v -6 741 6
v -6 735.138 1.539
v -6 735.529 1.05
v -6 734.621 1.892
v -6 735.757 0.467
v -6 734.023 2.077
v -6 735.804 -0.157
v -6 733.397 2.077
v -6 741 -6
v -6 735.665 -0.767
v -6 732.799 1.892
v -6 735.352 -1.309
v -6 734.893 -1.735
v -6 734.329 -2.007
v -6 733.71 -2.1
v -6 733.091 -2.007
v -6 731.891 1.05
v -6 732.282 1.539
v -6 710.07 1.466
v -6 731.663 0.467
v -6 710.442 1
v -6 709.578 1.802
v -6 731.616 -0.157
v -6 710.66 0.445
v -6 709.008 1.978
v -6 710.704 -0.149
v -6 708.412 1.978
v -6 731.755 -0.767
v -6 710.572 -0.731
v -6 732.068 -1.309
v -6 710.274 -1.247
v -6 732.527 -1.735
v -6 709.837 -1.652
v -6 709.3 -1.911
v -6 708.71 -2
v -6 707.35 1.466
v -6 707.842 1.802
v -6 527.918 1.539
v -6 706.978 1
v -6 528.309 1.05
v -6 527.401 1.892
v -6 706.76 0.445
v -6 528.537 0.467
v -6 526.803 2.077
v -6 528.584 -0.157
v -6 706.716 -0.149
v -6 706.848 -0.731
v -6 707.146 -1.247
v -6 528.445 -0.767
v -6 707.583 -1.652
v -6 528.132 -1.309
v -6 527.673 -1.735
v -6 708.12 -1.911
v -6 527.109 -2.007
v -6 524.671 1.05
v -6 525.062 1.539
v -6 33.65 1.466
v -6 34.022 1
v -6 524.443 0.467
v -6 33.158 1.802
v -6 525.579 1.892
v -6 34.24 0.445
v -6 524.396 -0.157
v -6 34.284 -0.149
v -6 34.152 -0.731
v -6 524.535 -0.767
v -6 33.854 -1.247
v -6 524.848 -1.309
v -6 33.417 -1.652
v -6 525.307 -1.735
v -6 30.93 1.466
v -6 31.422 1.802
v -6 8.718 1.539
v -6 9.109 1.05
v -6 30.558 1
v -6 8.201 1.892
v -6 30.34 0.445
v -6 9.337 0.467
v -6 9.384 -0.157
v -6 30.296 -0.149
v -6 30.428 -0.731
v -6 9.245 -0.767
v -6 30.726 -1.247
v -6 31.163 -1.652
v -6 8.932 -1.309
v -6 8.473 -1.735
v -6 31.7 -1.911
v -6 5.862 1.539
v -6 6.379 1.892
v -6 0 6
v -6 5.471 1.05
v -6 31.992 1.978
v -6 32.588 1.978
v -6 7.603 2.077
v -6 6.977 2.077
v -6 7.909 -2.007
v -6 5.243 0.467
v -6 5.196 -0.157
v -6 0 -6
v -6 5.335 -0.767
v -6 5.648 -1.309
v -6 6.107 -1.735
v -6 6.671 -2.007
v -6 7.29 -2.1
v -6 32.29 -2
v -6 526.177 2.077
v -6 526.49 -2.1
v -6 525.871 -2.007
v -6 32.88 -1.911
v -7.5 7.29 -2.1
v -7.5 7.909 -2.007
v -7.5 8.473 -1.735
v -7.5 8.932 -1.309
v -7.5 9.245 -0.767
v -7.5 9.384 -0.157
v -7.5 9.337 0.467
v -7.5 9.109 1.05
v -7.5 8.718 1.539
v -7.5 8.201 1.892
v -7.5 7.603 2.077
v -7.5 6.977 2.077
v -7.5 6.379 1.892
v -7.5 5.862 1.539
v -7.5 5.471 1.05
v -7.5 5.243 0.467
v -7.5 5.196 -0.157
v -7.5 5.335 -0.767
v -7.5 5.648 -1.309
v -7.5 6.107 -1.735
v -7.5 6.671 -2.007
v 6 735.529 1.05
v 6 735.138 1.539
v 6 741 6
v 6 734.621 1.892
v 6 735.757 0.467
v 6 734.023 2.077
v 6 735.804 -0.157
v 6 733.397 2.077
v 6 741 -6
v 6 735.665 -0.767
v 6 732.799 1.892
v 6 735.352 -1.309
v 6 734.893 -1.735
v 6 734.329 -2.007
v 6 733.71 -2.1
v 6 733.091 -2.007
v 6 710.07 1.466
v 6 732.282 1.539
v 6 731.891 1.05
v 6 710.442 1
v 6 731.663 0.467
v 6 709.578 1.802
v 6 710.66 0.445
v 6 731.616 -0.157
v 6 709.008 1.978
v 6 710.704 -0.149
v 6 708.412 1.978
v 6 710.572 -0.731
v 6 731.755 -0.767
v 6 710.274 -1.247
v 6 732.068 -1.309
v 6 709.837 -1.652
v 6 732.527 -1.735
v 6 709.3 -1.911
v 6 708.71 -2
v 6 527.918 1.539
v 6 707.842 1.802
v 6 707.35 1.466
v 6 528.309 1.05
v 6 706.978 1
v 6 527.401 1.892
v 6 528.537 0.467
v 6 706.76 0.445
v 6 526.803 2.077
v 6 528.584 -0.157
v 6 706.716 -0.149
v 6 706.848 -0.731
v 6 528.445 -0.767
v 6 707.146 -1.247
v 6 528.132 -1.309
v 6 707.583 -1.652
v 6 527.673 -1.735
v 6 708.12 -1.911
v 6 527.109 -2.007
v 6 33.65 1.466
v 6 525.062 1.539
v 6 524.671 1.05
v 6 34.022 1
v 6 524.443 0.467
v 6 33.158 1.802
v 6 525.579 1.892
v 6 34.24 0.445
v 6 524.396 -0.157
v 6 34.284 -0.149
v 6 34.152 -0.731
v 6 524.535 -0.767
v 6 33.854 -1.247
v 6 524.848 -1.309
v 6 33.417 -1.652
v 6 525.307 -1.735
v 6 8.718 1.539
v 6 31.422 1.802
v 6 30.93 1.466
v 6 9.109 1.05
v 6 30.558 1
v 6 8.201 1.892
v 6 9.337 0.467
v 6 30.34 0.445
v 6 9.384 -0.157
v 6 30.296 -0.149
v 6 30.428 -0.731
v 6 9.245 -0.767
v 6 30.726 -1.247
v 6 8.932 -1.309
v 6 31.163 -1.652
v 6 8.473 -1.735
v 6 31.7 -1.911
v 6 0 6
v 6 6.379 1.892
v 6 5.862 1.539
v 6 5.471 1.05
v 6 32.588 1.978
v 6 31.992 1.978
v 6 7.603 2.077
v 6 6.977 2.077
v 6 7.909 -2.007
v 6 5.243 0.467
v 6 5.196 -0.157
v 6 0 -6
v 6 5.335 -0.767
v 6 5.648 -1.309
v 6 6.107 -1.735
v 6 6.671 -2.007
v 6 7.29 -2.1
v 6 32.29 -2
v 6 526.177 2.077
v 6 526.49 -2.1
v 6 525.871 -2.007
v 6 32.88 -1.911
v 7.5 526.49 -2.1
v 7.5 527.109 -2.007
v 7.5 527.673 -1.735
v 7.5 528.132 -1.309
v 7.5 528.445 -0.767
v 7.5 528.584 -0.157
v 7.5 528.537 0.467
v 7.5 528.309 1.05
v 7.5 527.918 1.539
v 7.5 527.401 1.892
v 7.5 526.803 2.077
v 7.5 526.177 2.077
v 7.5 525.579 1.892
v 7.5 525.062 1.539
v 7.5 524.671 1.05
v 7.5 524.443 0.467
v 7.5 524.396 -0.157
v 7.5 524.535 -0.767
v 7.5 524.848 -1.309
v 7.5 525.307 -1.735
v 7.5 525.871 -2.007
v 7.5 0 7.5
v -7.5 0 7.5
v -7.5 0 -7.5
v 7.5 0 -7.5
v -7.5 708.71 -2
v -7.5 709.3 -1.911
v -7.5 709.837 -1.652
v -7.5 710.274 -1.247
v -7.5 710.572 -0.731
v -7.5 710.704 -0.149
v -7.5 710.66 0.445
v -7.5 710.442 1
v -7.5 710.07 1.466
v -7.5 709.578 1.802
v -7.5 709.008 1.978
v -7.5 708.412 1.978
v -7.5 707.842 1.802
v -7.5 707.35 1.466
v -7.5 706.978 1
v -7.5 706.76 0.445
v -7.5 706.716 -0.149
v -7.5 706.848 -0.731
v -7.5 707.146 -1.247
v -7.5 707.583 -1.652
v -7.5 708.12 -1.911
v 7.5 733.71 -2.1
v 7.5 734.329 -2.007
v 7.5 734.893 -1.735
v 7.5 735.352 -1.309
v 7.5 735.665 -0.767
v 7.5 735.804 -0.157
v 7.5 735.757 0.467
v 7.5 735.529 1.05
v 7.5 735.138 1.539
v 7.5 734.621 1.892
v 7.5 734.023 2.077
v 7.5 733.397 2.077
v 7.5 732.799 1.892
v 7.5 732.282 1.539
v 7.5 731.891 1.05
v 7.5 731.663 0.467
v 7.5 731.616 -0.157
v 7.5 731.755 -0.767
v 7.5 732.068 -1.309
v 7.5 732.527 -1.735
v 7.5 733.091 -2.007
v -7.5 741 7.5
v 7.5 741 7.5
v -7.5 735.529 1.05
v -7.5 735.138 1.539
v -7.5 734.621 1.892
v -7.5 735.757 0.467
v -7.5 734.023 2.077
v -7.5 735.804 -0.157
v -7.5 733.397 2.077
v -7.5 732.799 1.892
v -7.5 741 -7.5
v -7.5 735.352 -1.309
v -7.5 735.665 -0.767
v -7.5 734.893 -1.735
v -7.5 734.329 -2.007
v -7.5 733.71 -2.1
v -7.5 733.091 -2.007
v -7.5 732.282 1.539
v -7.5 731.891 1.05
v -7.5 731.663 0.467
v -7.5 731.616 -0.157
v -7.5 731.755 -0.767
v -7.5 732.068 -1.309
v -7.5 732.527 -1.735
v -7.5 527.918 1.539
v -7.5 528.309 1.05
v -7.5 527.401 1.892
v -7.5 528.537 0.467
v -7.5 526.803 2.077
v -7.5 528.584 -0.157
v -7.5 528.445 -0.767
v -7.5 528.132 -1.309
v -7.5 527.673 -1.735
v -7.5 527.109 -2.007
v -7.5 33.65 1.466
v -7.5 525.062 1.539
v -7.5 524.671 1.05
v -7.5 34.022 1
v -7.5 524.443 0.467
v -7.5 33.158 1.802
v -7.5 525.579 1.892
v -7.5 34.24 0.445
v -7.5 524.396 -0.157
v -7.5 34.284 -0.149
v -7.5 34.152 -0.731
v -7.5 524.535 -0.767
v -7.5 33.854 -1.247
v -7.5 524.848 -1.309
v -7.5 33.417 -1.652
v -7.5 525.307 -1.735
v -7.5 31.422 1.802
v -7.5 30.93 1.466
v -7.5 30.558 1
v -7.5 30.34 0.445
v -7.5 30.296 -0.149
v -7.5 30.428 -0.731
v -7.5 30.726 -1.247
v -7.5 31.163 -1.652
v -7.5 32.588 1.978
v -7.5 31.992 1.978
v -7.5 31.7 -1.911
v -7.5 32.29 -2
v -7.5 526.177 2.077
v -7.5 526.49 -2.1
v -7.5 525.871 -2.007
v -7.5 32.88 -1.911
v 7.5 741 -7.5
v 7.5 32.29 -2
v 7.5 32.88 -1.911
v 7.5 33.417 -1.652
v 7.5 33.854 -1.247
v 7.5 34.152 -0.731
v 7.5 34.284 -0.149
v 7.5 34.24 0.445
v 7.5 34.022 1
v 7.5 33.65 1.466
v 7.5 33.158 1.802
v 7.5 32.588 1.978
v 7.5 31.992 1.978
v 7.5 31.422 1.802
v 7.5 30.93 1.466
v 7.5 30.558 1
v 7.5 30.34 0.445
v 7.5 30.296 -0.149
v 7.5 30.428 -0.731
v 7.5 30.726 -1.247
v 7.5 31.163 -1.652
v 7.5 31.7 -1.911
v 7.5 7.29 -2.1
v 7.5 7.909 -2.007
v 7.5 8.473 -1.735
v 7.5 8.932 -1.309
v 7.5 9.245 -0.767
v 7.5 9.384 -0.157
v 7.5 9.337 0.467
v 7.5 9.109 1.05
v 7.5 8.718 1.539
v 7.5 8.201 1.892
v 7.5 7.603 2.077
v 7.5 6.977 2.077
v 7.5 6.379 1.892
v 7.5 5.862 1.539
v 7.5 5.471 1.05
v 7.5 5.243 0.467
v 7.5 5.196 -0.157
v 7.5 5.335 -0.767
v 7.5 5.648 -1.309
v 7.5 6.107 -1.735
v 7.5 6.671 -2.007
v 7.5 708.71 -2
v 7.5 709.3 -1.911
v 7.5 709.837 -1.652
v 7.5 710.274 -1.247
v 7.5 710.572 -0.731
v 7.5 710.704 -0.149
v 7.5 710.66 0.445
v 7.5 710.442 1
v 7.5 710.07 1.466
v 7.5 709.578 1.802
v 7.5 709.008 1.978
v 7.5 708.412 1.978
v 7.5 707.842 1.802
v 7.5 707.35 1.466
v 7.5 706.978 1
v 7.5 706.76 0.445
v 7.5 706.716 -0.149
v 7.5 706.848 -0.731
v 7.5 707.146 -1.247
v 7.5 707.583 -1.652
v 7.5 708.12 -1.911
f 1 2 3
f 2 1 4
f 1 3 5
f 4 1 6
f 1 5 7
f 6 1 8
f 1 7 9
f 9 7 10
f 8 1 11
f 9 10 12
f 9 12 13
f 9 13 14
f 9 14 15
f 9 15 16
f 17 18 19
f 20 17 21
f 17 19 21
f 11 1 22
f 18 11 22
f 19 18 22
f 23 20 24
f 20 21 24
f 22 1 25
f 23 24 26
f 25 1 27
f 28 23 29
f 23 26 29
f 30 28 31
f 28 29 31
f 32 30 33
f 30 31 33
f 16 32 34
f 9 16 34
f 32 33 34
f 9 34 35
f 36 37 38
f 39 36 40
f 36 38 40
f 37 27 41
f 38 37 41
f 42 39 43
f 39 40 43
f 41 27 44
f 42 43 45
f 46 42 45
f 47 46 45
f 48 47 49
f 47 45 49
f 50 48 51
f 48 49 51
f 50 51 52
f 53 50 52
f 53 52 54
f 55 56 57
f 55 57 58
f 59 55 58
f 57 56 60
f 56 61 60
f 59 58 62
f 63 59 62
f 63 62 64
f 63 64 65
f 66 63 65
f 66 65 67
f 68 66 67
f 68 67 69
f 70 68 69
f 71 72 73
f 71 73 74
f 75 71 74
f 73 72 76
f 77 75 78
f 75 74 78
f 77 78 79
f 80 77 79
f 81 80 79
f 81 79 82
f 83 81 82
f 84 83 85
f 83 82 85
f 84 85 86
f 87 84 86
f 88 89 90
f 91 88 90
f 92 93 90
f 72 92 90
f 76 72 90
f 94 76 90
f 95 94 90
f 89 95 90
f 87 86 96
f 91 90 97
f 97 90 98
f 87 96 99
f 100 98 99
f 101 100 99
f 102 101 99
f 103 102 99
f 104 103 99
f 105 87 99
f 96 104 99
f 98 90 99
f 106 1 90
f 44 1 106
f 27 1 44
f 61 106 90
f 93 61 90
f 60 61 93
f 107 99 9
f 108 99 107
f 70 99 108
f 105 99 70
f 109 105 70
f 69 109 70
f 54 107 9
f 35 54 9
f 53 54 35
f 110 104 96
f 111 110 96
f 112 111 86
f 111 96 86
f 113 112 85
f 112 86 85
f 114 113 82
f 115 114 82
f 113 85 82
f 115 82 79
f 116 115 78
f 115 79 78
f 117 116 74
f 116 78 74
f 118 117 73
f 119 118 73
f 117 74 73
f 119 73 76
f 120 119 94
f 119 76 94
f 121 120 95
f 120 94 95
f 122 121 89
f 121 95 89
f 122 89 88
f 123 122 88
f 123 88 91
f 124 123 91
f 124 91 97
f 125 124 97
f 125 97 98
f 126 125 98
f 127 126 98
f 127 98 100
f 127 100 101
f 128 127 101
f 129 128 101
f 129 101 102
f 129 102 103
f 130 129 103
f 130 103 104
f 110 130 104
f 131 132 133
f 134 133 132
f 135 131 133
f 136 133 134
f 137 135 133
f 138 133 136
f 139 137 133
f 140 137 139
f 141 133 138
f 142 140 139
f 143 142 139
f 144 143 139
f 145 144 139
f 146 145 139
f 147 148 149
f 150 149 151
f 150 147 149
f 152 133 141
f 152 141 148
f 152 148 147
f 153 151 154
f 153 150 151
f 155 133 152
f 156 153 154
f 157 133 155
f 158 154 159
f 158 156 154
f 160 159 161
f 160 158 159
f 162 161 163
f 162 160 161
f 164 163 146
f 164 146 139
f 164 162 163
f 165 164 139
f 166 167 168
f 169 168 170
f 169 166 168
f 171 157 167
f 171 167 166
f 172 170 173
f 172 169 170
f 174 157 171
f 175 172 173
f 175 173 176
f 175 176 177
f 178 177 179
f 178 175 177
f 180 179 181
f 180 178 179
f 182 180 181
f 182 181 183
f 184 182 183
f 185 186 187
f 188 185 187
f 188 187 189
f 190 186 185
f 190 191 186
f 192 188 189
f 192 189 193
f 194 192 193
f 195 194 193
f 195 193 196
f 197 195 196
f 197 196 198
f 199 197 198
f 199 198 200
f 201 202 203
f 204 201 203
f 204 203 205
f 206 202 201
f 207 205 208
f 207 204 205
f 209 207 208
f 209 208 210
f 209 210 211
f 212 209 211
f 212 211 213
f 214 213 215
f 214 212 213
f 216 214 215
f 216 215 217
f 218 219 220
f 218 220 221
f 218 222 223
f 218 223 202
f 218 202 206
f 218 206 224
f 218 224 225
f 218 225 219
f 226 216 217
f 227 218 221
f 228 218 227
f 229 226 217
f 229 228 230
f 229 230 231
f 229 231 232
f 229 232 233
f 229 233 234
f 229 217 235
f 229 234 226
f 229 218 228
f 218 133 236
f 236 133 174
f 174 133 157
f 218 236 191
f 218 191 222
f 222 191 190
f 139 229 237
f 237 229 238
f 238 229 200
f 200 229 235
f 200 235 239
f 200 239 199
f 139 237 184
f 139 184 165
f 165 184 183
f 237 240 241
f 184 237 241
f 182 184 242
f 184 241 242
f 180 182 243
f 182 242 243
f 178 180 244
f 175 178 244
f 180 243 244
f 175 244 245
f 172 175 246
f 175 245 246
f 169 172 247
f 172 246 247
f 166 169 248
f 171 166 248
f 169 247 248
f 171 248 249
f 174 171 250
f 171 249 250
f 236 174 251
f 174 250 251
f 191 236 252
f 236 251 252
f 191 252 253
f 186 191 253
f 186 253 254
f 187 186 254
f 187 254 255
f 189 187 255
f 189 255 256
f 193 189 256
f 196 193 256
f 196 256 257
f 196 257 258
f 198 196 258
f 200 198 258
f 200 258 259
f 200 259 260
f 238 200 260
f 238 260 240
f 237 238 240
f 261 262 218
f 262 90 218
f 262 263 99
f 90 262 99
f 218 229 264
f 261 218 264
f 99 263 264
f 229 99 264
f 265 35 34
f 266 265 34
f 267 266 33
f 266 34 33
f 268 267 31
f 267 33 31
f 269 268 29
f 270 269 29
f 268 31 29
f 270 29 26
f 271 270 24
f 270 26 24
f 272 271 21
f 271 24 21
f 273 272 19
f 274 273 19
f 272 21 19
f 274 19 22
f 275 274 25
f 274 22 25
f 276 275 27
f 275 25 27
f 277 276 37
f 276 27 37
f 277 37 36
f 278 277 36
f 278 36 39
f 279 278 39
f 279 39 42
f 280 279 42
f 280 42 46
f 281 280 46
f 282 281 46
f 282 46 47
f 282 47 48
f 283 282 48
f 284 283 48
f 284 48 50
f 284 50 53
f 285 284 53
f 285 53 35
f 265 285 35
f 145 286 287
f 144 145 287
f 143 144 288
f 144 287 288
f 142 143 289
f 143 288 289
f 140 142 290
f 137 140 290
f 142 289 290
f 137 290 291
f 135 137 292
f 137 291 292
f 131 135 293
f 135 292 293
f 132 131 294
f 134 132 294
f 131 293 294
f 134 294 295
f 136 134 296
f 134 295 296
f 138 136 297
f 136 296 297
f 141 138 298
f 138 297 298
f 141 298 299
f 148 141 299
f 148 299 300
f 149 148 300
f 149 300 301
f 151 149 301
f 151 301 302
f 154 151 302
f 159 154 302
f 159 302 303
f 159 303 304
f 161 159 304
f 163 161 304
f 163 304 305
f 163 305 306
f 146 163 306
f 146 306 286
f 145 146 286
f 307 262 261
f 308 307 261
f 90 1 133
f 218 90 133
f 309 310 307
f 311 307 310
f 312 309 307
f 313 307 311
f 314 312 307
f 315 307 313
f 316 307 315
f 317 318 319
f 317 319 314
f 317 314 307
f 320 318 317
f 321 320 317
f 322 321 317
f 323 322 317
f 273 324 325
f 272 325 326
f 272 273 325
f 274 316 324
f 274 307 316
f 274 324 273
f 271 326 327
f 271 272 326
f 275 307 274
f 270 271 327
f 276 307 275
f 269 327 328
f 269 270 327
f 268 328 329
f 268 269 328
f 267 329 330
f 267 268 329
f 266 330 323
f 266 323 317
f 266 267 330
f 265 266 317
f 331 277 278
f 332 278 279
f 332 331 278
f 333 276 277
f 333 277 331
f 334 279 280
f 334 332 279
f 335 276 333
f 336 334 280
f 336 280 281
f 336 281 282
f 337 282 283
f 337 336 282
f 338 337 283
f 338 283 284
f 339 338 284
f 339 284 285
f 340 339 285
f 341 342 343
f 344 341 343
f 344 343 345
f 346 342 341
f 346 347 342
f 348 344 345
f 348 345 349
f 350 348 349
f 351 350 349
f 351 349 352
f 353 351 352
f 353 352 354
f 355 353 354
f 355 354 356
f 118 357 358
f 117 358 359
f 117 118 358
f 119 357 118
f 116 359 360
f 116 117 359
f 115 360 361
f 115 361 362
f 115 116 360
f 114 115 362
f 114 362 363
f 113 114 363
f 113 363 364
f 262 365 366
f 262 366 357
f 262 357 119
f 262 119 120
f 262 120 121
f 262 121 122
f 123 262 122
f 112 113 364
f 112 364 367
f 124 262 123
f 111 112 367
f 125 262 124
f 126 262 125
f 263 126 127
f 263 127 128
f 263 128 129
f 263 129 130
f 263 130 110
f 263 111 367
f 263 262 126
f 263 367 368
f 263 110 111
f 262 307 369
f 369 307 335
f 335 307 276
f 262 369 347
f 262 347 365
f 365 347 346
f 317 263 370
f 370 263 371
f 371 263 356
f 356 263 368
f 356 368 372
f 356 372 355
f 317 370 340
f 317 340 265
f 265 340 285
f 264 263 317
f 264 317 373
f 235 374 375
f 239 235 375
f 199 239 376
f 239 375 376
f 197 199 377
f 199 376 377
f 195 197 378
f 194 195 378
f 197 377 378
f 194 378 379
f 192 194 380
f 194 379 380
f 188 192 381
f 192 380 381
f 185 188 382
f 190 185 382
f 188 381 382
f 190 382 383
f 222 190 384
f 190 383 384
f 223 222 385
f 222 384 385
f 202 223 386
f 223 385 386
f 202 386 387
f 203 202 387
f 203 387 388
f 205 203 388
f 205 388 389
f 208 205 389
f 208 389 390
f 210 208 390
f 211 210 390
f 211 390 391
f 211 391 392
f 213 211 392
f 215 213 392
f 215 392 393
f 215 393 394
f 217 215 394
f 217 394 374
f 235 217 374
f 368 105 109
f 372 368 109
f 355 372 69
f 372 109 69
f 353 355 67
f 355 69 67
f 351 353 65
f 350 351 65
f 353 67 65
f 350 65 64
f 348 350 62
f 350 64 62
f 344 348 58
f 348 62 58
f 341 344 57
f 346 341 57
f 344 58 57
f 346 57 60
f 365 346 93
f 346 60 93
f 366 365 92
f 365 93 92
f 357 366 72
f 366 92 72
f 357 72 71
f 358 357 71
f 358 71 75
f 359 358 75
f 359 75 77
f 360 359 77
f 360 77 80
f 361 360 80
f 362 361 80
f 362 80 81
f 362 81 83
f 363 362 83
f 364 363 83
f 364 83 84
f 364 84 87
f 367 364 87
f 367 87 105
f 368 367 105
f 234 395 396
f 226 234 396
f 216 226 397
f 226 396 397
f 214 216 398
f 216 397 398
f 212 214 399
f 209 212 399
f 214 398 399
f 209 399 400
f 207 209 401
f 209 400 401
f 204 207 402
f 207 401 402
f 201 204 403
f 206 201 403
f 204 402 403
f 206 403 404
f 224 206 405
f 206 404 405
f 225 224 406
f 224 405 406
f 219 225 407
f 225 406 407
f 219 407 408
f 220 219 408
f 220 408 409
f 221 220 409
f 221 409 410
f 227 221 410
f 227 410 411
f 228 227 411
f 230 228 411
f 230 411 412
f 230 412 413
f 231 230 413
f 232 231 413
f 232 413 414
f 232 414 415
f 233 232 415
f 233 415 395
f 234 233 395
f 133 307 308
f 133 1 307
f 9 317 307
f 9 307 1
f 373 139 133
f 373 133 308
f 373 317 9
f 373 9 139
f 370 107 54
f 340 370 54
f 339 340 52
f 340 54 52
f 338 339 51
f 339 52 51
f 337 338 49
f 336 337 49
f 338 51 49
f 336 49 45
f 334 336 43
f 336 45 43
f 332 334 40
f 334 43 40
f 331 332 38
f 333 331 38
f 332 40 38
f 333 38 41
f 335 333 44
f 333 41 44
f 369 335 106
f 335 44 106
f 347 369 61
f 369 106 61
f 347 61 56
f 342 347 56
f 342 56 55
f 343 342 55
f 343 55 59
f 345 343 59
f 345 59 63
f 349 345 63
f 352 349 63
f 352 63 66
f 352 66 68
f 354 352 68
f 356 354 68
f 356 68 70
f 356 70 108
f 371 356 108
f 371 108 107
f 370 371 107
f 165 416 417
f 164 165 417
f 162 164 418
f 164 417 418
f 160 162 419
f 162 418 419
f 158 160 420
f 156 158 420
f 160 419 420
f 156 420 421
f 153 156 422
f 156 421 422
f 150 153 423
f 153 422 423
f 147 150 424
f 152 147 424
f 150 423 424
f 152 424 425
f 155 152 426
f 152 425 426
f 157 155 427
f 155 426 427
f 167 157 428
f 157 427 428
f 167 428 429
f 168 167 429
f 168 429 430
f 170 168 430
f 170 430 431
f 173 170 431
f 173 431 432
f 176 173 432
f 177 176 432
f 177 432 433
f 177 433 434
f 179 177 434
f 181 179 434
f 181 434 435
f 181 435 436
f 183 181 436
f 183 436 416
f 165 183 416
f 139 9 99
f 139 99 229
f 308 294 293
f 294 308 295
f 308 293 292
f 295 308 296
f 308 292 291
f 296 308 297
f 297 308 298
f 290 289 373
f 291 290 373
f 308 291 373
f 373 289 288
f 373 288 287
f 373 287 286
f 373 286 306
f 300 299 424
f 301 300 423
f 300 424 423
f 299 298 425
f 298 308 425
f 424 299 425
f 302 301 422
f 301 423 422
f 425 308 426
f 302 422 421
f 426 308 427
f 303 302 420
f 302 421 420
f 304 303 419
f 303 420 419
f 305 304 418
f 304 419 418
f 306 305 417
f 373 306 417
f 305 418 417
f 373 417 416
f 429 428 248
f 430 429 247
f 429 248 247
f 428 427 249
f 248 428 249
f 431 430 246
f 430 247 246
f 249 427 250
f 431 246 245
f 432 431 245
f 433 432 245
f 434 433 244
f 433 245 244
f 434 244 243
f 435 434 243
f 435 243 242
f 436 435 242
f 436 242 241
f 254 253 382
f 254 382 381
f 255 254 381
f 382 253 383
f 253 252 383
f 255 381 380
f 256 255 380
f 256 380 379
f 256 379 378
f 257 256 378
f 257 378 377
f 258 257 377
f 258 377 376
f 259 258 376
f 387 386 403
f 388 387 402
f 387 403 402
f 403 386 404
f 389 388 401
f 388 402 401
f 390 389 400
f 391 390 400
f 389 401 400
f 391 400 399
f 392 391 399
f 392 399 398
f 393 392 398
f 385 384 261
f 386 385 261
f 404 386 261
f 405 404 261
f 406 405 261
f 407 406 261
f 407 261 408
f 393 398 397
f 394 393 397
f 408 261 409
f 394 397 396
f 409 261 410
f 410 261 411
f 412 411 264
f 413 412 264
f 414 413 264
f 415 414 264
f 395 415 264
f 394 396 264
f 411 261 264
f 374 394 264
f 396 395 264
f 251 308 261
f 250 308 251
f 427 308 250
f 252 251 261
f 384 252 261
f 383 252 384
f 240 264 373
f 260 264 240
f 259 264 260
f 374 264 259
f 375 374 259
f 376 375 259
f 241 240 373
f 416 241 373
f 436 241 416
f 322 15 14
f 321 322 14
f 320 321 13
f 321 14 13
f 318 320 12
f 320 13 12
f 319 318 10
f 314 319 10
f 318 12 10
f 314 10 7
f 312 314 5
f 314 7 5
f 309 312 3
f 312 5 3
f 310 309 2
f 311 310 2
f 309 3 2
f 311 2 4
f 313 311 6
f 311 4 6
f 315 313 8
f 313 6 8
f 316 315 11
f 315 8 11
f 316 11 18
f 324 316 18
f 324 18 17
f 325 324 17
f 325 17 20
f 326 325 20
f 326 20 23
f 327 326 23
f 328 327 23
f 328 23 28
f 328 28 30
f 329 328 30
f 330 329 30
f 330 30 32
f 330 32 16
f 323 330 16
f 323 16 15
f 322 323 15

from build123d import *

# Parameters (mm, degrees)
SKETCH_1_W          = 15
SKETCH_1_H          = 15
SKETCH_1_W_2        = 12
SKETCH_1_H_2        = 12
EXTRUDE_1_DEPTH     = 741
SKETCH_2_R          = 2.1
SKETCH_2_R_2        = 2
CUT_EXTRUDE_1_DEPTH = 742.189753032


with BuildPart() as part:
    # ｽｹｯﾁ1 → 押し出し-薄板1 (new body)
    with BuildSketch(Plane(origin=(0, 0, 0), x_dir=(1, 0, 0), z_dir=(0, 1, 0))):
        Rectangle(SKETCH_1_W, SKETCH_1_H)
        Rectangle(SKETCH_1_W_2, SKETCH_1_H_2, mode=Mode.SUBTRACT)
    extrude(amount=EXTRUDE_1_DEPTH)

    # ｽｹｯﾁ2 → ｶｯﾄ - 押し出し1 (cut, through all)
    with BuildSketch(Plane(origin=(7.5, 0, 0), x_dir=(0, 0, -1), z_dir=(1, 0, 0))):
        with Locations((0, 7.29)):
            Circle(SKETCH_2_R)
        with Locations((0, 32.29)):
            Circle(SKETCH_2_R_2)
        with Locations((0, 708.71)):
            Circle(SKETCH_2_R_2)
        with Locations((0, 733.71)):
            Circle(SKETCH_2_R)
        with Locations((0, 526.49)):
            Circle(SKETCH_2_R)
    extrude(amount=-CUT_EXTRUDE_1_DEPTH, mode=Mode.SUBTRACT)


solid = part.part
